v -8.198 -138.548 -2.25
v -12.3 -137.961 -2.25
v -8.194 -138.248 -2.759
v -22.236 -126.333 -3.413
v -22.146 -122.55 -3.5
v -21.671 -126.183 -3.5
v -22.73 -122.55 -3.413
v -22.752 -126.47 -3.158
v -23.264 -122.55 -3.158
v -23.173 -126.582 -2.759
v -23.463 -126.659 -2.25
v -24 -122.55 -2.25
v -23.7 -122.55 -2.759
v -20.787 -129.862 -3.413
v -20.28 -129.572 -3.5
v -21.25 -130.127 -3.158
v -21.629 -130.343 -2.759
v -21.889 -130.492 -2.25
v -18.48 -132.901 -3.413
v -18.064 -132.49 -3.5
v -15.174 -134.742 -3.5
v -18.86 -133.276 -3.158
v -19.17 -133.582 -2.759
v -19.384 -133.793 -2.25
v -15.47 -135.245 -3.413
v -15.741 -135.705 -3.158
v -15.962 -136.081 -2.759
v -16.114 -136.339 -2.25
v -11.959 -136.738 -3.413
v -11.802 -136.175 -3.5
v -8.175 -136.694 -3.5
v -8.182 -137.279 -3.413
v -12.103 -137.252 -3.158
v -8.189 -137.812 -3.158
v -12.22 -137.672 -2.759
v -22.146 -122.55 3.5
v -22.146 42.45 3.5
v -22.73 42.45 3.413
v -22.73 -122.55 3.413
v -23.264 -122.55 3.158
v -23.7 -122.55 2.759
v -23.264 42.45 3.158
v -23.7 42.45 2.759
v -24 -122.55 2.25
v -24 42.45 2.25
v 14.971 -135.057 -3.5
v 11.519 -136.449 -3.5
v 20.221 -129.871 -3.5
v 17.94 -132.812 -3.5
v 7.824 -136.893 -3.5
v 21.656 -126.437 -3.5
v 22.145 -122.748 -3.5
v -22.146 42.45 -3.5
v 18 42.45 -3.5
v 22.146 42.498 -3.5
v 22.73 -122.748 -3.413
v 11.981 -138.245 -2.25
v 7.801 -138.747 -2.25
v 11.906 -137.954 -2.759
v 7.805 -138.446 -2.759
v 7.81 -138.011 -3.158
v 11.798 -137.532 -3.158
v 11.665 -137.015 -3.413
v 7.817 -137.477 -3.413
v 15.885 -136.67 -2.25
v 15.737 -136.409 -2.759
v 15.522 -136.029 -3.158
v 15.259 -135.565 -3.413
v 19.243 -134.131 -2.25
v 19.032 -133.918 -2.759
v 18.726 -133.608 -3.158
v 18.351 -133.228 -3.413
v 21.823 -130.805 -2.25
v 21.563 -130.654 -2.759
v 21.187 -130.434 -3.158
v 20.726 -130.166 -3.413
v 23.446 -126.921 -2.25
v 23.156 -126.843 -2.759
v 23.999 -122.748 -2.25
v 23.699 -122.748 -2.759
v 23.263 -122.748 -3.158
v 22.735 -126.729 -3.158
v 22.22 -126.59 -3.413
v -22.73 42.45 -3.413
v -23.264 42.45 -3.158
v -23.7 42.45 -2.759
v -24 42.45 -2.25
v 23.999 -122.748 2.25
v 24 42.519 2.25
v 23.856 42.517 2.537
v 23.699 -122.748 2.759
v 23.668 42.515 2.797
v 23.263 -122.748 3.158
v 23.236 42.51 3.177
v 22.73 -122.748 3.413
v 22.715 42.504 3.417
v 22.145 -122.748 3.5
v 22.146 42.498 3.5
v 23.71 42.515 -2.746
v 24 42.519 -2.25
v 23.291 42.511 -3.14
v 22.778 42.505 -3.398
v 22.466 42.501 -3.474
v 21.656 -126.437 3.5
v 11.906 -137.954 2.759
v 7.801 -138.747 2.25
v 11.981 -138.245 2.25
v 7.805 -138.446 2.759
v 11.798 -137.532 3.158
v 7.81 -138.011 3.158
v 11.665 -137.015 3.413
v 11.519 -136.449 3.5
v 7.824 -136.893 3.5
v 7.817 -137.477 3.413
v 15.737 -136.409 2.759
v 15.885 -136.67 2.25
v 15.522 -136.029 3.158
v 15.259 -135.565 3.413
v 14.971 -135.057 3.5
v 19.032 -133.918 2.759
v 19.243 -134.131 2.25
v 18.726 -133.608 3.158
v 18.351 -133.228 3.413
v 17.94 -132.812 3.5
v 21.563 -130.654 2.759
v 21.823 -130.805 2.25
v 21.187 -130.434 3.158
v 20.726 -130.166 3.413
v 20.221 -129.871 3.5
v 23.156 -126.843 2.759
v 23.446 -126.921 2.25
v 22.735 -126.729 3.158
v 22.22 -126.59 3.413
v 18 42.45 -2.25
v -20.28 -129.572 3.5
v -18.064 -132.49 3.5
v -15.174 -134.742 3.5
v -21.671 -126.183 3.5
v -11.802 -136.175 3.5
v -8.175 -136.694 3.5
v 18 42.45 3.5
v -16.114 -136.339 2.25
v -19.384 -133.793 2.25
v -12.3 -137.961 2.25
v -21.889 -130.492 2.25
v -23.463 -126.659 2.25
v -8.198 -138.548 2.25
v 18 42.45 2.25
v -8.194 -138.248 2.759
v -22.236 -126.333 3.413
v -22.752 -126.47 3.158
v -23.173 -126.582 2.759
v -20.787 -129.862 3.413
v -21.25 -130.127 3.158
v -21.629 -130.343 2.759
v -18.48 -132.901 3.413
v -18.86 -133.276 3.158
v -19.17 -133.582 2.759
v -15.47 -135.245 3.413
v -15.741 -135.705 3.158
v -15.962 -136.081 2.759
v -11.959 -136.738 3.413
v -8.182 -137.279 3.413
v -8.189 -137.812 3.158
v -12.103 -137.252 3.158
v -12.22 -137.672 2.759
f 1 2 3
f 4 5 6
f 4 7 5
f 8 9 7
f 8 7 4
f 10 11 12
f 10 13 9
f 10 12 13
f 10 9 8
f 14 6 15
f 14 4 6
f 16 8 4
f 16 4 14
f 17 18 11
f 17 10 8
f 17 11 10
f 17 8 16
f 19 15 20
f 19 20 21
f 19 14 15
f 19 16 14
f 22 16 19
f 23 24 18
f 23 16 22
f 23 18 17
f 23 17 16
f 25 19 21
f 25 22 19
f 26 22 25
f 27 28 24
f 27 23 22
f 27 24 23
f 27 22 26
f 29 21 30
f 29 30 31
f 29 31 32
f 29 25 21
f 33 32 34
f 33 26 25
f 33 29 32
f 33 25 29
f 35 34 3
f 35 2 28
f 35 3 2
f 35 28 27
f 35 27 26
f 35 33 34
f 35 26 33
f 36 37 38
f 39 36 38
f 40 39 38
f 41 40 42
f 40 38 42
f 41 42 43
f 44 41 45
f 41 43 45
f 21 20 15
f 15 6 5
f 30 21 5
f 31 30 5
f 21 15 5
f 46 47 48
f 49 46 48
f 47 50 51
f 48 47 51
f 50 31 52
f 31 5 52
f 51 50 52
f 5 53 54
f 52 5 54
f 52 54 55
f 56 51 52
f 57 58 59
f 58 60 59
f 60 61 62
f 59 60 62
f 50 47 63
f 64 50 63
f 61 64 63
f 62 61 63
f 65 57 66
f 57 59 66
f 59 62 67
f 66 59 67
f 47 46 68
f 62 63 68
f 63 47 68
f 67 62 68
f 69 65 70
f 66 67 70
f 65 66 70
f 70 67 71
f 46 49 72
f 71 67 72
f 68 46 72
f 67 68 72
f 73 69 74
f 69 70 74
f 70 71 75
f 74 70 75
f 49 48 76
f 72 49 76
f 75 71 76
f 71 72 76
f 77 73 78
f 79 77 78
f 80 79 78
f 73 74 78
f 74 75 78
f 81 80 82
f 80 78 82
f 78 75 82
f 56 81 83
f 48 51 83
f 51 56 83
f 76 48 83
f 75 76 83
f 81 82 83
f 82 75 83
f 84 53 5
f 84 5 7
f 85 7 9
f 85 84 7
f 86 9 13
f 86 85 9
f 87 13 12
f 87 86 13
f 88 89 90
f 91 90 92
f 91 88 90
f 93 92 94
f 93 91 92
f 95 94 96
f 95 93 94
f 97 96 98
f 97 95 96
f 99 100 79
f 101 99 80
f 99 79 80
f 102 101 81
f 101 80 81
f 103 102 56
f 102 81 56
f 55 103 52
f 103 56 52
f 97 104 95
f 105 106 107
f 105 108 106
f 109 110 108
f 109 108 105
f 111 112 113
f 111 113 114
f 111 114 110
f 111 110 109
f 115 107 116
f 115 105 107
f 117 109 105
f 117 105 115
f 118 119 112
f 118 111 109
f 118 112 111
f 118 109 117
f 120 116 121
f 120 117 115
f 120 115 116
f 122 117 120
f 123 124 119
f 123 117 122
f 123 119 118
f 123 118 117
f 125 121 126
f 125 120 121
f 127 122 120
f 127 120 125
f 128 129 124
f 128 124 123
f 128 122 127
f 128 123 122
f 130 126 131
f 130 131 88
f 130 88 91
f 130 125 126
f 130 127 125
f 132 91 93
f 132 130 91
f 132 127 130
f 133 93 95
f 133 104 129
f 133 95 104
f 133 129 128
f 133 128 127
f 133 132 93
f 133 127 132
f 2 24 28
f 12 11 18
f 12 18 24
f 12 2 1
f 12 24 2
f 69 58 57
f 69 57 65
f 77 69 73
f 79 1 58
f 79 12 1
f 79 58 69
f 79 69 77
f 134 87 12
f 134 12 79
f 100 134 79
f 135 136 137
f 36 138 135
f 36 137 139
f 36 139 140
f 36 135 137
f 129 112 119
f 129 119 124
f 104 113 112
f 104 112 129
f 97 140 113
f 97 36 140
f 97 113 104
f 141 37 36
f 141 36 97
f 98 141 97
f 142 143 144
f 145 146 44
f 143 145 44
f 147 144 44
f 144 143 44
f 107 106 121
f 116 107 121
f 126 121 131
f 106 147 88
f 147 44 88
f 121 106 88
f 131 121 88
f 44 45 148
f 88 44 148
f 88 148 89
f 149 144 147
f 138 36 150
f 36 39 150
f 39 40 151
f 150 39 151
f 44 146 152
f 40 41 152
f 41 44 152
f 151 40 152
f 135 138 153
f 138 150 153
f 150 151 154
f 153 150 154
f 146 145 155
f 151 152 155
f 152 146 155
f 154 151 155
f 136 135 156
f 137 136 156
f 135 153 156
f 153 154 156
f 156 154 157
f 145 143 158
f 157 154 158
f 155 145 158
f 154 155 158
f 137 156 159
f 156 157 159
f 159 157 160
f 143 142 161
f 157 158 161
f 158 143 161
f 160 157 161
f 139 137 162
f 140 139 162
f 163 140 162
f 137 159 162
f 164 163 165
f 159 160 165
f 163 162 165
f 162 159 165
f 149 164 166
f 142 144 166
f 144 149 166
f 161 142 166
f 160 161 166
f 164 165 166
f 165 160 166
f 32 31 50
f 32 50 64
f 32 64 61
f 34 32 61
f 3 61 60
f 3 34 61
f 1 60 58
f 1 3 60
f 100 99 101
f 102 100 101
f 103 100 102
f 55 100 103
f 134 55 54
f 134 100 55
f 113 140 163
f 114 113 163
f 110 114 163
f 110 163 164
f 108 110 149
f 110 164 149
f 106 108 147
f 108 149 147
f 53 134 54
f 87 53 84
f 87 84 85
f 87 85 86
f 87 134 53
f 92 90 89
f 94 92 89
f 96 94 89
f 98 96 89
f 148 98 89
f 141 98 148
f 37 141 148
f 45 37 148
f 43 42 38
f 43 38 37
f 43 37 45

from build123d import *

# Parameters (mm, degrees)
F1_DEPTH        = 3.5
F2_DEPTH        = 2.25
F3_T1_DEPTH     = 169.9016407579
F3_T3_DEPTH     = 16.0006816658
F3_T5_DEPTH     = 169.6351240544
F3_T8_ANGLE     = 90.7094753215
F3_T10_ANGLE    = 89.290335423
F3_S1_T1_DEPTH  = 169.9016407579
F3_S1_T3_DEPTH  = 16.0006816658
F3_S1_T5_DEPTH  = 169.6351240544
F3_S1_T8_ANGLE  = 90.7094753215
F3_S1_T10_ANGLE = 89.290335423


# Not quite as in the source:
# - a fillet or chamfer that OpenCascade refuses, or shapes differently, is made with other operations: its cross-section is extruded or revolved along the edge and cut away or added


with BuildPart() as f1:
    # F0 (on Top) → F1 (new body, symmetric)
    with BuildSketch(Plane.XY):
        with BuildLine():
            Line((18, 42.4503772799), (-18, 42.4503772799))
            Line((-18, 42.4503772799), (-24.0000008941, 42.4503772799))
            Line((-24.0000008941, 42.4503772799), (-24.0000008941, -122.5496227201))
            ThreePointArc((-24.0000008941, -122.5496227201), (-19.3835574329, -133.7930496347), (-8.1981706793, -138.5483963291))
            Line((-8.1981706793, -138.5483963291), (7.8012836493, -138.7465754402))
            ThreePointArc((7.8012836493, -138.7465754402), (19.2428624423, -134.1313778333), (23.9994552225, -122.7478546813))
            Line((23.9994552225, -122.7478546813), (24.0000011197, 42.5186620212))
            Line((24.0000011197, 42.5186620212), (18, 42.4503772799))
        make_face()
    extrude(amount=F1_DEPTH, both=True)

    # F0 (on Top) → F2 (cut, symmetric)
    with BuildSketch(Plane.XY):
        with BuildLine():
            Line((18, 42.4503772799), (-18, 42.4503772799))
            Line((-18, 42.4503772799), (-24.0000008941, 42.4503772799))
            Line((-24.0000008941, 42.4503772799), (-24.0000008941, -122.5496227201))
            ThreePointArc((-24.0000008941, -122.5496227201), (-19.3835574329, -133.7930496347), (-8.1981706793, -138.5483963291))
            Line((-8.1981706793, -138.5483963291), (7.8012836493, -138.7465754402))
            ThreePointArc((7.8012836493, -138.7465754402), (19.2428624423, -134.1313778333), (23.9994552225, -122.7478546813))
            Line((23.9994552225, -122.7478546813), (24.0000011197, 42.5186620212))
            Line((24.0000011197, 42.5186620212), (18, 42.4503772799))
        make_face()
    extrude(amount=F2_DEPTH, both=True, mode=Mode.SUBTRACT)

    # F3: fillet of radius 2 on 1 edges, made by hand

    # F3_s2 → F3_t1 (cut)
    with BuildSketch(Plane(origin=(-0.0004054521, -122.7477754066, 0), x_dir=(0, 0, 1), z_dir=(3.3031e-06, 1, 0))):
        with BuildLine():
            ThreePointArc((-2.25, 23.9998606748), (-3.1583123952, 23.2638450417), (-3.5, 22.145811053))
            Line((-3.5, 22.145811053), (-3.5, 23.9998606748))
            Line((-3.5, 23.9998606748), (-2.25, 23.9998606748))
        make_face()
    extrude(amount=F3_T1_DEPTH, mode=Mode.SUBTRACT)

    # F3_s4 → F3_t3 (cut)
    with BuildSketch(Plane(origin=(-6.4810304011, 0.0802780406, 0), x_dir=(0, 0, 1), z_dir=(0.9999232947, -0.0123856668, 0))):
        with BuildLine():
            ThreePointArc((-3.5, 136.7852591194), (-3.1583123952, 137.9032931082), (-2.25, 138.6393087412))
            Line((-2.25, 138.6393087412), (-3.5, 138.6393087412))
            Line((-3.5, 138.6393087412), (-3.5, 136.7852591194))
        make_face()
    extrude(amount=F3_T3_DEPTH, mode=Mode.SUBTRACT)

    # F3_s6 → F3_t5 (cut)
    with BuildSketch(Plane.XZ.offset(-47.0855013343)):
        with BuildLine():
            ThreePointArc((-22.1459512723, -3.5), (-23.263985261, -3.1583123952), (-24.0000008941, -2.25))
            Line((-24.0000008941, -2.25), (-24.0000008941, -3.5))
            Line((-24.0000008941, -3.5), (-22.1459512723, -3.5))
        make_face()
    extrude(amount=F3_T5_DEPTH, mode=Mode.SUBTRACT)

    # F3_s7 → F3_t8 (revolve, cut)
    with BuildSketch(Plane(origin=(9.5184239274, -0.1179010705, 0), x_dir=(0, 0, 1), z_dir=(-0.9999232947, 0.0123856668, 0))):
        with BuildLine():
            ThreePointArc((-2.25, -138.6393087412), (-3.1583123952, -137.9032931082), (-3.5, -136.7852591194))
            Line((-3.5, -136.7852591194), (-3.5, -138.6393087412))
            Line((-3.5, -138.6393087412), (-2.25, -138.6393087412))
        make_face()
    revolve(axis=Axis((7.9994543285, -122.7478018312, -3.5), (0, 0, 1)), revolution_arc=F3_T8_ANGLE, mode=Mode.SUBTRACT)

    # F3_s9 → F3_t10 (revolve, cut)
    with BuildSketch(Plane.XZ.offset(122.5496227201)):
        with BuildLine():
            ThreePointArc((-22.1459512723, -3.5), (-23.263985261, -3.1583123952), (-24.0000008941, -2.25))
            Line((-24.0000008941, -2.25), (-24.0000008941, -3.5))
            Line((-24.0000008941, -3.5), (-22.1459512723, -3.5))
        make_face()
    revolve(axis=Axis((-8, -122.5496227201, -3.5), (0, 0, 1)), revolution_arc=F3_T10_ANGLE, mode=Mode.SUBTRACT)

    # F3#s1: fillet of radius 2 on 1 edges, made by hand

    # F3_s1_s2 → F3_s1_t1 (cut)
    with BuildSketch(Plane(origin=(-0.0004054521, -122.7477754066, 0), x_dir=(0, 0, 1), z_dir=(3.3031e-06, 1, 0))):
        with BuildLine():
            ThreePointArc((2.25, 23.9998606748), (3.1583123952, 23.2638450417), (3.5, 22.145811053))
            Line((3.5, 22.145811053), (3.5, 23.9998606748))
            Line((3.5, 23.9998606748), (2.25, 23.9998606748))
        make_face()
    extrude(amount=F3_S1_T1_DEPTH, mode=Mode.SUBTRACT)

    # F3_s1_s4 → F3_s1_t3 (cut)
    with BuildSketch(Plane(origin=(-6.4810304011, 0.0802780406, 0), x_dir=(0, 0, 1), z_dir=(0.9999232947, -0.0123856668, 0))):
        with BuildLine():
            ThreePointArc((3.5, 136.7852591194), (3.1583123952, 137.9032931082), (2.25, 138.6393087412))
            Line((2.25, 138.6393087412), (3.5, 138.6393087412))
            Line((3.5, 138.6393087412), (3.5, 136.7852591194))
        make_face()
    extrude(amount=F3_S1_T3_DEPTH, mode=Mode.SUBTRACT)

    # F3_s1_s6 → F3_s1_t5 (cut)
    with BuildSketch(Plane.XZ.offset(-47.0855013343)):
        with BuildLine():
            ThreePointArc((-22.1459512723, 3.5), (-23.263985261, 3.1583123952), (-24.0000008941, 2.25))
            Line((-24.0000008941, 2.25), (-24.0000008941, 3.5))
            Line((-24.0000008941, 3.5), (-22.1459512723, 3.5))
        make_face()
    extrude(amount=F3_S1_T5_DEPTH, mode=Mode.SUBTRACT)

    # F3_s1_s7 → F3_s1_t8 (revolve, cut)
    with BuildSketch(Plane(origin=(9.5184239274, -0.1179010705, 0), x_dir=(0, 0, 1), z_dir=(-0.9999232947, 0.0123856668, 0))):
        with BuildLine():
            ThreePointArc((2.25, -138.6393087412), (3.1583123952, -137.9032931082), (3.5, -136.7852591194))
            Line((3.5, -136.7852591194), (3.5, -138.6393087412))
            Line((3.5, -138.6393087412), (2.25, -138.6393087412))
        make_face()
    revolve(axis=Axis((7.9994543285, -122.7478018312, 3.5), (0, 0, 1)), revolution_arc=F3_S1_T8_ANGLE, mode=Mode.SUBTRACT)

    # F3_s1_s9 → F3_s1_t10 (revolve, cut)
    with BuildSketch(Plane.XZ.offset(122.5496227201)):
        with BuildLine():
            ThreePointArc((-22.1459512723, 3.5), (-23.263985261, 3.1583123952), (-24.0000008941, 2.25))
            Line((-24.0000008941, 2.25), (-24.0000008941, 3.5))
            Line((-24.0000008941, 3.5), (-22.1459512723, 3.5))
        make_face()
    revolve(axis=Axis((-8, -122.5496227201, 3.5), (0, 0, 1)), revolution_arc=F3_S1_T10_ANGLE, mode=Mode.SUBTRACT)


solid = f1.part
